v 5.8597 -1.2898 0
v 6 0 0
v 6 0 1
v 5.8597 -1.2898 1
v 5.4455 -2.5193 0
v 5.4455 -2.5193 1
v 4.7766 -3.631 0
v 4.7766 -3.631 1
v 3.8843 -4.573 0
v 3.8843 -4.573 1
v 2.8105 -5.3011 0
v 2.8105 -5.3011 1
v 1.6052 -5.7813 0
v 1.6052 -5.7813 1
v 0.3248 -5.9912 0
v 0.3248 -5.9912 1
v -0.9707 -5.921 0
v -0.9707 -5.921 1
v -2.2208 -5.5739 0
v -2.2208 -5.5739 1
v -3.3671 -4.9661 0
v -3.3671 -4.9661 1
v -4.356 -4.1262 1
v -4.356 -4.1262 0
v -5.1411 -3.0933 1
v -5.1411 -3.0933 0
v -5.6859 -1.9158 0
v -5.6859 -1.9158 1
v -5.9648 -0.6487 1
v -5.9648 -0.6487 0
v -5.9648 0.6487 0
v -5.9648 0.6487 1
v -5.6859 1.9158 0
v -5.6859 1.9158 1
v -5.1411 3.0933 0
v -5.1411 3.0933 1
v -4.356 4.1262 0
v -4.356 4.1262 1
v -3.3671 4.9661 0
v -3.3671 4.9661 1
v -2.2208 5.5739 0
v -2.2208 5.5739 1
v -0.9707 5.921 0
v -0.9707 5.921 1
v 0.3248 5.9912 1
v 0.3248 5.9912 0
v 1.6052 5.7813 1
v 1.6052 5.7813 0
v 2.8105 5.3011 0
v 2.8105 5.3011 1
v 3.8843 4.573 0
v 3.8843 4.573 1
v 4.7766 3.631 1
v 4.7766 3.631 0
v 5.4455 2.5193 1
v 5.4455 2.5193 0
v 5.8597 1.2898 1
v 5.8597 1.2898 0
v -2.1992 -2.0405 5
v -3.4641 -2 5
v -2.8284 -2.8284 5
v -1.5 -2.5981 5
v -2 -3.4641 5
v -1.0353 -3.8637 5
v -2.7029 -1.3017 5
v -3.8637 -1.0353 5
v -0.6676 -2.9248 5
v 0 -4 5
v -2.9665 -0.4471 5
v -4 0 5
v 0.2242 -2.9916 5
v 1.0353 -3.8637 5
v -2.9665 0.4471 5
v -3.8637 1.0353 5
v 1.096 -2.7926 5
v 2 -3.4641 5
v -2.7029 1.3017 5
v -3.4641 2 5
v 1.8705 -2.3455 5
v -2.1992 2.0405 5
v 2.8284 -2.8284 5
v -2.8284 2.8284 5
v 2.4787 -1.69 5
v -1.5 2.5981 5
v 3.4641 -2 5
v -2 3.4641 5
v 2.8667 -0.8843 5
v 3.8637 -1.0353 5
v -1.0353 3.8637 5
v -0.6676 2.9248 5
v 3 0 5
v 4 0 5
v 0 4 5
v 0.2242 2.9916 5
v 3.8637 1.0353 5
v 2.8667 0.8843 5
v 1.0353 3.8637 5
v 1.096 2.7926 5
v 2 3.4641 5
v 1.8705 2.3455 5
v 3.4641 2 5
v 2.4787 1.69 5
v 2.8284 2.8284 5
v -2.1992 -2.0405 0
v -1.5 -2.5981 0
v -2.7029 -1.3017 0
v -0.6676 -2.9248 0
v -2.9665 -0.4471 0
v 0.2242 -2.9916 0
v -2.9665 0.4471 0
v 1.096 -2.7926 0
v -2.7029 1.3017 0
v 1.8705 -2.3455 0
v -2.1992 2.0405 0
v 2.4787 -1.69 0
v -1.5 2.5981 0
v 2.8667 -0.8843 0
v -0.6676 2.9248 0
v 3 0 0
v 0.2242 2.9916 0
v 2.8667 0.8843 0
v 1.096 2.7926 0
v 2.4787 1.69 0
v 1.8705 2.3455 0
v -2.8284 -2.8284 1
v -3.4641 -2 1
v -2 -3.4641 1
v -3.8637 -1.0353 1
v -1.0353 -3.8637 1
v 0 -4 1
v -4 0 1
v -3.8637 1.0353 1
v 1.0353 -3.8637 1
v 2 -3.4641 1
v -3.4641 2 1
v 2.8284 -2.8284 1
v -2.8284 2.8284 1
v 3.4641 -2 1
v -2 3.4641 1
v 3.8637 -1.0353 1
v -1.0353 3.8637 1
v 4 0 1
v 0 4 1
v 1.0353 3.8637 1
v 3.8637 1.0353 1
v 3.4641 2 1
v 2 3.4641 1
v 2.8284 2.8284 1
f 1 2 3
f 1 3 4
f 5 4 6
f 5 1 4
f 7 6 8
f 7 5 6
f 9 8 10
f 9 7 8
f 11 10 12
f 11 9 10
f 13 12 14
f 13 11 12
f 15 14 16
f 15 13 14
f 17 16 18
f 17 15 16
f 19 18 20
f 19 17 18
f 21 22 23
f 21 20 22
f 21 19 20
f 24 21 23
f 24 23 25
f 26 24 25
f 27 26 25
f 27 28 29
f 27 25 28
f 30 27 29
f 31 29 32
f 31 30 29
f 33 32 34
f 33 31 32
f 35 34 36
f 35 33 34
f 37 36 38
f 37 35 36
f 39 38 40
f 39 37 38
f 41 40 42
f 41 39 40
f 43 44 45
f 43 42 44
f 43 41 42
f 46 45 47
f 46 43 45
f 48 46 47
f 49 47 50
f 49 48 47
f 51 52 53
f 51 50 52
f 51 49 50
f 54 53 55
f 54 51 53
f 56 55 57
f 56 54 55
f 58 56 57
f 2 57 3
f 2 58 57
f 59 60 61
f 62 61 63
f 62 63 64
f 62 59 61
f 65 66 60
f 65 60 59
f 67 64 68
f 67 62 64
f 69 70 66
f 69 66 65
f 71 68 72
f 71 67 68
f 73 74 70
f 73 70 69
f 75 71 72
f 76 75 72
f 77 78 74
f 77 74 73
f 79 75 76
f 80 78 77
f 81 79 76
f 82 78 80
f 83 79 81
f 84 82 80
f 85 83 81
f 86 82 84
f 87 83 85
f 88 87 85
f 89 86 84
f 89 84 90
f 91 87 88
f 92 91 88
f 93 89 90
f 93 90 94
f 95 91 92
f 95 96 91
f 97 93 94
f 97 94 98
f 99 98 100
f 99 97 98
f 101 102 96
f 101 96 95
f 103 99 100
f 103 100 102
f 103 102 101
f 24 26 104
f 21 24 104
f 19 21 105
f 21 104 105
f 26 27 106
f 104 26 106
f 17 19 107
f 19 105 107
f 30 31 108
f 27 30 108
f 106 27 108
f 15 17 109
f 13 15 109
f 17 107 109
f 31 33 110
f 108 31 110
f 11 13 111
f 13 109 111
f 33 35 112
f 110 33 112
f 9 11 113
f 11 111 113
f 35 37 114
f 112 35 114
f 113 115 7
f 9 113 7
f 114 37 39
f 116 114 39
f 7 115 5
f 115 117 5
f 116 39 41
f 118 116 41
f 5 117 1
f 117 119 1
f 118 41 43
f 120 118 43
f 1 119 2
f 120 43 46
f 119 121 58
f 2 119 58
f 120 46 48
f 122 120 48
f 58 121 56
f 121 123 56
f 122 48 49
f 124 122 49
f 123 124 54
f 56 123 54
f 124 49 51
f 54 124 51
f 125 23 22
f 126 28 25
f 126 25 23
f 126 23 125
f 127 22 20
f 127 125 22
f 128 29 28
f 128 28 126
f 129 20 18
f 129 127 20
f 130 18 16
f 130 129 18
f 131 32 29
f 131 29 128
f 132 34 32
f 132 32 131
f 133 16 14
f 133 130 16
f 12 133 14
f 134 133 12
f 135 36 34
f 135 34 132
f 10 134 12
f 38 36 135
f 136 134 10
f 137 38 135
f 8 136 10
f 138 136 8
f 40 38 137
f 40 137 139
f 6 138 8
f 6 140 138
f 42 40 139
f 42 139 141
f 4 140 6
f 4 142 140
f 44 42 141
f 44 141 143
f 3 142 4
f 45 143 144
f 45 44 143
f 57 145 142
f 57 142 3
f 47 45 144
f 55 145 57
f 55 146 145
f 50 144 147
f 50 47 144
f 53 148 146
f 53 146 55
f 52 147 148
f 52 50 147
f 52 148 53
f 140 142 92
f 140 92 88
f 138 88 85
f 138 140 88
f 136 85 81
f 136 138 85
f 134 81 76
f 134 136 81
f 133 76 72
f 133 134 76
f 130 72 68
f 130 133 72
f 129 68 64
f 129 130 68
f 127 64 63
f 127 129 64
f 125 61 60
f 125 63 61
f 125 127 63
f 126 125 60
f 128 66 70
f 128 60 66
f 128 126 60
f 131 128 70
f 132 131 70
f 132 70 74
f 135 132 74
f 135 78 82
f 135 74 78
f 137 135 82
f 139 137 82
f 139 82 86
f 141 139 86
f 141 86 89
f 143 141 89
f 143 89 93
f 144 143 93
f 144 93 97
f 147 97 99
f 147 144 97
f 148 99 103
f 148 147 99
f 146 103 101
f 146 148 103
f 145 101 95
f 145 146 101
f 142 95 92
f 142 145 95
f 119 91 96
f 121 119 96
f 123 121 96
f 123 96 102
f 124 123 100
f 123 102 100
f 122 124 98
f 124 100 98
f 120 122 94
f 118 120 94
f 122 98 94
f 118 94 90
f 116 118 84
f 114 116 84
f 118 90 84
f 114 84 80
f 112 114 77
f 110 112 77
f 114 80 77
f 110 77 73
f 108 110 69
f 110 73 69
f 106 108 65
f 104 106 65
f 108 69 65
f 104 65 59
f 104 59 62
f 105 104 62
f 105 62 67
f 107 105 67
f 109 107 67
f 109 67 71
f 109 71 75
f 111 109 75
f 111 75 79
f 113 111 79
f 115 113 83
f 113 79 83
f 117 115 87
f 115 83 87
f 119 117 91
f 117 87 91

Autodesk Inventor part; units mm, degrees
ref_plane "YZ Plane" through (0, 0, 0) normal (1, 0, 0) x (0, 1, 0)
ref_plane "XZ Plane" through (0, 0, 0) normal (0, 1, 0) x (-1, 0, 0)
ref_plane "XY Plane" through (0, 0, 0) normal (0, 0, 1) x (1, 0, 0)
sketch "スケッチ1" plane through (0, 0, 0) normal (0, 0, 1) x (1, 0, 0)
  circle A0 centre (0, 0) radius 6
  dimension "d0" = 12
extrude "押し出し1" add sketch "スケッチ1" along normal blind 1
sketch "スケッチ2" plane through (0, 0, 1) normal (0, 0, 1) x (1, 0, 0)
  circle A0 centre (0, 0) radius 4
  dimension "d3" = 8
extrude "押し出し2" add sketch "スケッチ2" along normal blind 4
sketch "スケッチ3" plane through (0, 0, 5) normal (0, 0, 1) x (1, 0, 0)
  circle A0 centre (0, 0) radius 3
  dimension "d6" = 6
extrude "押し出し3" cut sketch "スケッチ3" against normal through all
properties part number "oiles_bush6" material "ABS プラスチック"
